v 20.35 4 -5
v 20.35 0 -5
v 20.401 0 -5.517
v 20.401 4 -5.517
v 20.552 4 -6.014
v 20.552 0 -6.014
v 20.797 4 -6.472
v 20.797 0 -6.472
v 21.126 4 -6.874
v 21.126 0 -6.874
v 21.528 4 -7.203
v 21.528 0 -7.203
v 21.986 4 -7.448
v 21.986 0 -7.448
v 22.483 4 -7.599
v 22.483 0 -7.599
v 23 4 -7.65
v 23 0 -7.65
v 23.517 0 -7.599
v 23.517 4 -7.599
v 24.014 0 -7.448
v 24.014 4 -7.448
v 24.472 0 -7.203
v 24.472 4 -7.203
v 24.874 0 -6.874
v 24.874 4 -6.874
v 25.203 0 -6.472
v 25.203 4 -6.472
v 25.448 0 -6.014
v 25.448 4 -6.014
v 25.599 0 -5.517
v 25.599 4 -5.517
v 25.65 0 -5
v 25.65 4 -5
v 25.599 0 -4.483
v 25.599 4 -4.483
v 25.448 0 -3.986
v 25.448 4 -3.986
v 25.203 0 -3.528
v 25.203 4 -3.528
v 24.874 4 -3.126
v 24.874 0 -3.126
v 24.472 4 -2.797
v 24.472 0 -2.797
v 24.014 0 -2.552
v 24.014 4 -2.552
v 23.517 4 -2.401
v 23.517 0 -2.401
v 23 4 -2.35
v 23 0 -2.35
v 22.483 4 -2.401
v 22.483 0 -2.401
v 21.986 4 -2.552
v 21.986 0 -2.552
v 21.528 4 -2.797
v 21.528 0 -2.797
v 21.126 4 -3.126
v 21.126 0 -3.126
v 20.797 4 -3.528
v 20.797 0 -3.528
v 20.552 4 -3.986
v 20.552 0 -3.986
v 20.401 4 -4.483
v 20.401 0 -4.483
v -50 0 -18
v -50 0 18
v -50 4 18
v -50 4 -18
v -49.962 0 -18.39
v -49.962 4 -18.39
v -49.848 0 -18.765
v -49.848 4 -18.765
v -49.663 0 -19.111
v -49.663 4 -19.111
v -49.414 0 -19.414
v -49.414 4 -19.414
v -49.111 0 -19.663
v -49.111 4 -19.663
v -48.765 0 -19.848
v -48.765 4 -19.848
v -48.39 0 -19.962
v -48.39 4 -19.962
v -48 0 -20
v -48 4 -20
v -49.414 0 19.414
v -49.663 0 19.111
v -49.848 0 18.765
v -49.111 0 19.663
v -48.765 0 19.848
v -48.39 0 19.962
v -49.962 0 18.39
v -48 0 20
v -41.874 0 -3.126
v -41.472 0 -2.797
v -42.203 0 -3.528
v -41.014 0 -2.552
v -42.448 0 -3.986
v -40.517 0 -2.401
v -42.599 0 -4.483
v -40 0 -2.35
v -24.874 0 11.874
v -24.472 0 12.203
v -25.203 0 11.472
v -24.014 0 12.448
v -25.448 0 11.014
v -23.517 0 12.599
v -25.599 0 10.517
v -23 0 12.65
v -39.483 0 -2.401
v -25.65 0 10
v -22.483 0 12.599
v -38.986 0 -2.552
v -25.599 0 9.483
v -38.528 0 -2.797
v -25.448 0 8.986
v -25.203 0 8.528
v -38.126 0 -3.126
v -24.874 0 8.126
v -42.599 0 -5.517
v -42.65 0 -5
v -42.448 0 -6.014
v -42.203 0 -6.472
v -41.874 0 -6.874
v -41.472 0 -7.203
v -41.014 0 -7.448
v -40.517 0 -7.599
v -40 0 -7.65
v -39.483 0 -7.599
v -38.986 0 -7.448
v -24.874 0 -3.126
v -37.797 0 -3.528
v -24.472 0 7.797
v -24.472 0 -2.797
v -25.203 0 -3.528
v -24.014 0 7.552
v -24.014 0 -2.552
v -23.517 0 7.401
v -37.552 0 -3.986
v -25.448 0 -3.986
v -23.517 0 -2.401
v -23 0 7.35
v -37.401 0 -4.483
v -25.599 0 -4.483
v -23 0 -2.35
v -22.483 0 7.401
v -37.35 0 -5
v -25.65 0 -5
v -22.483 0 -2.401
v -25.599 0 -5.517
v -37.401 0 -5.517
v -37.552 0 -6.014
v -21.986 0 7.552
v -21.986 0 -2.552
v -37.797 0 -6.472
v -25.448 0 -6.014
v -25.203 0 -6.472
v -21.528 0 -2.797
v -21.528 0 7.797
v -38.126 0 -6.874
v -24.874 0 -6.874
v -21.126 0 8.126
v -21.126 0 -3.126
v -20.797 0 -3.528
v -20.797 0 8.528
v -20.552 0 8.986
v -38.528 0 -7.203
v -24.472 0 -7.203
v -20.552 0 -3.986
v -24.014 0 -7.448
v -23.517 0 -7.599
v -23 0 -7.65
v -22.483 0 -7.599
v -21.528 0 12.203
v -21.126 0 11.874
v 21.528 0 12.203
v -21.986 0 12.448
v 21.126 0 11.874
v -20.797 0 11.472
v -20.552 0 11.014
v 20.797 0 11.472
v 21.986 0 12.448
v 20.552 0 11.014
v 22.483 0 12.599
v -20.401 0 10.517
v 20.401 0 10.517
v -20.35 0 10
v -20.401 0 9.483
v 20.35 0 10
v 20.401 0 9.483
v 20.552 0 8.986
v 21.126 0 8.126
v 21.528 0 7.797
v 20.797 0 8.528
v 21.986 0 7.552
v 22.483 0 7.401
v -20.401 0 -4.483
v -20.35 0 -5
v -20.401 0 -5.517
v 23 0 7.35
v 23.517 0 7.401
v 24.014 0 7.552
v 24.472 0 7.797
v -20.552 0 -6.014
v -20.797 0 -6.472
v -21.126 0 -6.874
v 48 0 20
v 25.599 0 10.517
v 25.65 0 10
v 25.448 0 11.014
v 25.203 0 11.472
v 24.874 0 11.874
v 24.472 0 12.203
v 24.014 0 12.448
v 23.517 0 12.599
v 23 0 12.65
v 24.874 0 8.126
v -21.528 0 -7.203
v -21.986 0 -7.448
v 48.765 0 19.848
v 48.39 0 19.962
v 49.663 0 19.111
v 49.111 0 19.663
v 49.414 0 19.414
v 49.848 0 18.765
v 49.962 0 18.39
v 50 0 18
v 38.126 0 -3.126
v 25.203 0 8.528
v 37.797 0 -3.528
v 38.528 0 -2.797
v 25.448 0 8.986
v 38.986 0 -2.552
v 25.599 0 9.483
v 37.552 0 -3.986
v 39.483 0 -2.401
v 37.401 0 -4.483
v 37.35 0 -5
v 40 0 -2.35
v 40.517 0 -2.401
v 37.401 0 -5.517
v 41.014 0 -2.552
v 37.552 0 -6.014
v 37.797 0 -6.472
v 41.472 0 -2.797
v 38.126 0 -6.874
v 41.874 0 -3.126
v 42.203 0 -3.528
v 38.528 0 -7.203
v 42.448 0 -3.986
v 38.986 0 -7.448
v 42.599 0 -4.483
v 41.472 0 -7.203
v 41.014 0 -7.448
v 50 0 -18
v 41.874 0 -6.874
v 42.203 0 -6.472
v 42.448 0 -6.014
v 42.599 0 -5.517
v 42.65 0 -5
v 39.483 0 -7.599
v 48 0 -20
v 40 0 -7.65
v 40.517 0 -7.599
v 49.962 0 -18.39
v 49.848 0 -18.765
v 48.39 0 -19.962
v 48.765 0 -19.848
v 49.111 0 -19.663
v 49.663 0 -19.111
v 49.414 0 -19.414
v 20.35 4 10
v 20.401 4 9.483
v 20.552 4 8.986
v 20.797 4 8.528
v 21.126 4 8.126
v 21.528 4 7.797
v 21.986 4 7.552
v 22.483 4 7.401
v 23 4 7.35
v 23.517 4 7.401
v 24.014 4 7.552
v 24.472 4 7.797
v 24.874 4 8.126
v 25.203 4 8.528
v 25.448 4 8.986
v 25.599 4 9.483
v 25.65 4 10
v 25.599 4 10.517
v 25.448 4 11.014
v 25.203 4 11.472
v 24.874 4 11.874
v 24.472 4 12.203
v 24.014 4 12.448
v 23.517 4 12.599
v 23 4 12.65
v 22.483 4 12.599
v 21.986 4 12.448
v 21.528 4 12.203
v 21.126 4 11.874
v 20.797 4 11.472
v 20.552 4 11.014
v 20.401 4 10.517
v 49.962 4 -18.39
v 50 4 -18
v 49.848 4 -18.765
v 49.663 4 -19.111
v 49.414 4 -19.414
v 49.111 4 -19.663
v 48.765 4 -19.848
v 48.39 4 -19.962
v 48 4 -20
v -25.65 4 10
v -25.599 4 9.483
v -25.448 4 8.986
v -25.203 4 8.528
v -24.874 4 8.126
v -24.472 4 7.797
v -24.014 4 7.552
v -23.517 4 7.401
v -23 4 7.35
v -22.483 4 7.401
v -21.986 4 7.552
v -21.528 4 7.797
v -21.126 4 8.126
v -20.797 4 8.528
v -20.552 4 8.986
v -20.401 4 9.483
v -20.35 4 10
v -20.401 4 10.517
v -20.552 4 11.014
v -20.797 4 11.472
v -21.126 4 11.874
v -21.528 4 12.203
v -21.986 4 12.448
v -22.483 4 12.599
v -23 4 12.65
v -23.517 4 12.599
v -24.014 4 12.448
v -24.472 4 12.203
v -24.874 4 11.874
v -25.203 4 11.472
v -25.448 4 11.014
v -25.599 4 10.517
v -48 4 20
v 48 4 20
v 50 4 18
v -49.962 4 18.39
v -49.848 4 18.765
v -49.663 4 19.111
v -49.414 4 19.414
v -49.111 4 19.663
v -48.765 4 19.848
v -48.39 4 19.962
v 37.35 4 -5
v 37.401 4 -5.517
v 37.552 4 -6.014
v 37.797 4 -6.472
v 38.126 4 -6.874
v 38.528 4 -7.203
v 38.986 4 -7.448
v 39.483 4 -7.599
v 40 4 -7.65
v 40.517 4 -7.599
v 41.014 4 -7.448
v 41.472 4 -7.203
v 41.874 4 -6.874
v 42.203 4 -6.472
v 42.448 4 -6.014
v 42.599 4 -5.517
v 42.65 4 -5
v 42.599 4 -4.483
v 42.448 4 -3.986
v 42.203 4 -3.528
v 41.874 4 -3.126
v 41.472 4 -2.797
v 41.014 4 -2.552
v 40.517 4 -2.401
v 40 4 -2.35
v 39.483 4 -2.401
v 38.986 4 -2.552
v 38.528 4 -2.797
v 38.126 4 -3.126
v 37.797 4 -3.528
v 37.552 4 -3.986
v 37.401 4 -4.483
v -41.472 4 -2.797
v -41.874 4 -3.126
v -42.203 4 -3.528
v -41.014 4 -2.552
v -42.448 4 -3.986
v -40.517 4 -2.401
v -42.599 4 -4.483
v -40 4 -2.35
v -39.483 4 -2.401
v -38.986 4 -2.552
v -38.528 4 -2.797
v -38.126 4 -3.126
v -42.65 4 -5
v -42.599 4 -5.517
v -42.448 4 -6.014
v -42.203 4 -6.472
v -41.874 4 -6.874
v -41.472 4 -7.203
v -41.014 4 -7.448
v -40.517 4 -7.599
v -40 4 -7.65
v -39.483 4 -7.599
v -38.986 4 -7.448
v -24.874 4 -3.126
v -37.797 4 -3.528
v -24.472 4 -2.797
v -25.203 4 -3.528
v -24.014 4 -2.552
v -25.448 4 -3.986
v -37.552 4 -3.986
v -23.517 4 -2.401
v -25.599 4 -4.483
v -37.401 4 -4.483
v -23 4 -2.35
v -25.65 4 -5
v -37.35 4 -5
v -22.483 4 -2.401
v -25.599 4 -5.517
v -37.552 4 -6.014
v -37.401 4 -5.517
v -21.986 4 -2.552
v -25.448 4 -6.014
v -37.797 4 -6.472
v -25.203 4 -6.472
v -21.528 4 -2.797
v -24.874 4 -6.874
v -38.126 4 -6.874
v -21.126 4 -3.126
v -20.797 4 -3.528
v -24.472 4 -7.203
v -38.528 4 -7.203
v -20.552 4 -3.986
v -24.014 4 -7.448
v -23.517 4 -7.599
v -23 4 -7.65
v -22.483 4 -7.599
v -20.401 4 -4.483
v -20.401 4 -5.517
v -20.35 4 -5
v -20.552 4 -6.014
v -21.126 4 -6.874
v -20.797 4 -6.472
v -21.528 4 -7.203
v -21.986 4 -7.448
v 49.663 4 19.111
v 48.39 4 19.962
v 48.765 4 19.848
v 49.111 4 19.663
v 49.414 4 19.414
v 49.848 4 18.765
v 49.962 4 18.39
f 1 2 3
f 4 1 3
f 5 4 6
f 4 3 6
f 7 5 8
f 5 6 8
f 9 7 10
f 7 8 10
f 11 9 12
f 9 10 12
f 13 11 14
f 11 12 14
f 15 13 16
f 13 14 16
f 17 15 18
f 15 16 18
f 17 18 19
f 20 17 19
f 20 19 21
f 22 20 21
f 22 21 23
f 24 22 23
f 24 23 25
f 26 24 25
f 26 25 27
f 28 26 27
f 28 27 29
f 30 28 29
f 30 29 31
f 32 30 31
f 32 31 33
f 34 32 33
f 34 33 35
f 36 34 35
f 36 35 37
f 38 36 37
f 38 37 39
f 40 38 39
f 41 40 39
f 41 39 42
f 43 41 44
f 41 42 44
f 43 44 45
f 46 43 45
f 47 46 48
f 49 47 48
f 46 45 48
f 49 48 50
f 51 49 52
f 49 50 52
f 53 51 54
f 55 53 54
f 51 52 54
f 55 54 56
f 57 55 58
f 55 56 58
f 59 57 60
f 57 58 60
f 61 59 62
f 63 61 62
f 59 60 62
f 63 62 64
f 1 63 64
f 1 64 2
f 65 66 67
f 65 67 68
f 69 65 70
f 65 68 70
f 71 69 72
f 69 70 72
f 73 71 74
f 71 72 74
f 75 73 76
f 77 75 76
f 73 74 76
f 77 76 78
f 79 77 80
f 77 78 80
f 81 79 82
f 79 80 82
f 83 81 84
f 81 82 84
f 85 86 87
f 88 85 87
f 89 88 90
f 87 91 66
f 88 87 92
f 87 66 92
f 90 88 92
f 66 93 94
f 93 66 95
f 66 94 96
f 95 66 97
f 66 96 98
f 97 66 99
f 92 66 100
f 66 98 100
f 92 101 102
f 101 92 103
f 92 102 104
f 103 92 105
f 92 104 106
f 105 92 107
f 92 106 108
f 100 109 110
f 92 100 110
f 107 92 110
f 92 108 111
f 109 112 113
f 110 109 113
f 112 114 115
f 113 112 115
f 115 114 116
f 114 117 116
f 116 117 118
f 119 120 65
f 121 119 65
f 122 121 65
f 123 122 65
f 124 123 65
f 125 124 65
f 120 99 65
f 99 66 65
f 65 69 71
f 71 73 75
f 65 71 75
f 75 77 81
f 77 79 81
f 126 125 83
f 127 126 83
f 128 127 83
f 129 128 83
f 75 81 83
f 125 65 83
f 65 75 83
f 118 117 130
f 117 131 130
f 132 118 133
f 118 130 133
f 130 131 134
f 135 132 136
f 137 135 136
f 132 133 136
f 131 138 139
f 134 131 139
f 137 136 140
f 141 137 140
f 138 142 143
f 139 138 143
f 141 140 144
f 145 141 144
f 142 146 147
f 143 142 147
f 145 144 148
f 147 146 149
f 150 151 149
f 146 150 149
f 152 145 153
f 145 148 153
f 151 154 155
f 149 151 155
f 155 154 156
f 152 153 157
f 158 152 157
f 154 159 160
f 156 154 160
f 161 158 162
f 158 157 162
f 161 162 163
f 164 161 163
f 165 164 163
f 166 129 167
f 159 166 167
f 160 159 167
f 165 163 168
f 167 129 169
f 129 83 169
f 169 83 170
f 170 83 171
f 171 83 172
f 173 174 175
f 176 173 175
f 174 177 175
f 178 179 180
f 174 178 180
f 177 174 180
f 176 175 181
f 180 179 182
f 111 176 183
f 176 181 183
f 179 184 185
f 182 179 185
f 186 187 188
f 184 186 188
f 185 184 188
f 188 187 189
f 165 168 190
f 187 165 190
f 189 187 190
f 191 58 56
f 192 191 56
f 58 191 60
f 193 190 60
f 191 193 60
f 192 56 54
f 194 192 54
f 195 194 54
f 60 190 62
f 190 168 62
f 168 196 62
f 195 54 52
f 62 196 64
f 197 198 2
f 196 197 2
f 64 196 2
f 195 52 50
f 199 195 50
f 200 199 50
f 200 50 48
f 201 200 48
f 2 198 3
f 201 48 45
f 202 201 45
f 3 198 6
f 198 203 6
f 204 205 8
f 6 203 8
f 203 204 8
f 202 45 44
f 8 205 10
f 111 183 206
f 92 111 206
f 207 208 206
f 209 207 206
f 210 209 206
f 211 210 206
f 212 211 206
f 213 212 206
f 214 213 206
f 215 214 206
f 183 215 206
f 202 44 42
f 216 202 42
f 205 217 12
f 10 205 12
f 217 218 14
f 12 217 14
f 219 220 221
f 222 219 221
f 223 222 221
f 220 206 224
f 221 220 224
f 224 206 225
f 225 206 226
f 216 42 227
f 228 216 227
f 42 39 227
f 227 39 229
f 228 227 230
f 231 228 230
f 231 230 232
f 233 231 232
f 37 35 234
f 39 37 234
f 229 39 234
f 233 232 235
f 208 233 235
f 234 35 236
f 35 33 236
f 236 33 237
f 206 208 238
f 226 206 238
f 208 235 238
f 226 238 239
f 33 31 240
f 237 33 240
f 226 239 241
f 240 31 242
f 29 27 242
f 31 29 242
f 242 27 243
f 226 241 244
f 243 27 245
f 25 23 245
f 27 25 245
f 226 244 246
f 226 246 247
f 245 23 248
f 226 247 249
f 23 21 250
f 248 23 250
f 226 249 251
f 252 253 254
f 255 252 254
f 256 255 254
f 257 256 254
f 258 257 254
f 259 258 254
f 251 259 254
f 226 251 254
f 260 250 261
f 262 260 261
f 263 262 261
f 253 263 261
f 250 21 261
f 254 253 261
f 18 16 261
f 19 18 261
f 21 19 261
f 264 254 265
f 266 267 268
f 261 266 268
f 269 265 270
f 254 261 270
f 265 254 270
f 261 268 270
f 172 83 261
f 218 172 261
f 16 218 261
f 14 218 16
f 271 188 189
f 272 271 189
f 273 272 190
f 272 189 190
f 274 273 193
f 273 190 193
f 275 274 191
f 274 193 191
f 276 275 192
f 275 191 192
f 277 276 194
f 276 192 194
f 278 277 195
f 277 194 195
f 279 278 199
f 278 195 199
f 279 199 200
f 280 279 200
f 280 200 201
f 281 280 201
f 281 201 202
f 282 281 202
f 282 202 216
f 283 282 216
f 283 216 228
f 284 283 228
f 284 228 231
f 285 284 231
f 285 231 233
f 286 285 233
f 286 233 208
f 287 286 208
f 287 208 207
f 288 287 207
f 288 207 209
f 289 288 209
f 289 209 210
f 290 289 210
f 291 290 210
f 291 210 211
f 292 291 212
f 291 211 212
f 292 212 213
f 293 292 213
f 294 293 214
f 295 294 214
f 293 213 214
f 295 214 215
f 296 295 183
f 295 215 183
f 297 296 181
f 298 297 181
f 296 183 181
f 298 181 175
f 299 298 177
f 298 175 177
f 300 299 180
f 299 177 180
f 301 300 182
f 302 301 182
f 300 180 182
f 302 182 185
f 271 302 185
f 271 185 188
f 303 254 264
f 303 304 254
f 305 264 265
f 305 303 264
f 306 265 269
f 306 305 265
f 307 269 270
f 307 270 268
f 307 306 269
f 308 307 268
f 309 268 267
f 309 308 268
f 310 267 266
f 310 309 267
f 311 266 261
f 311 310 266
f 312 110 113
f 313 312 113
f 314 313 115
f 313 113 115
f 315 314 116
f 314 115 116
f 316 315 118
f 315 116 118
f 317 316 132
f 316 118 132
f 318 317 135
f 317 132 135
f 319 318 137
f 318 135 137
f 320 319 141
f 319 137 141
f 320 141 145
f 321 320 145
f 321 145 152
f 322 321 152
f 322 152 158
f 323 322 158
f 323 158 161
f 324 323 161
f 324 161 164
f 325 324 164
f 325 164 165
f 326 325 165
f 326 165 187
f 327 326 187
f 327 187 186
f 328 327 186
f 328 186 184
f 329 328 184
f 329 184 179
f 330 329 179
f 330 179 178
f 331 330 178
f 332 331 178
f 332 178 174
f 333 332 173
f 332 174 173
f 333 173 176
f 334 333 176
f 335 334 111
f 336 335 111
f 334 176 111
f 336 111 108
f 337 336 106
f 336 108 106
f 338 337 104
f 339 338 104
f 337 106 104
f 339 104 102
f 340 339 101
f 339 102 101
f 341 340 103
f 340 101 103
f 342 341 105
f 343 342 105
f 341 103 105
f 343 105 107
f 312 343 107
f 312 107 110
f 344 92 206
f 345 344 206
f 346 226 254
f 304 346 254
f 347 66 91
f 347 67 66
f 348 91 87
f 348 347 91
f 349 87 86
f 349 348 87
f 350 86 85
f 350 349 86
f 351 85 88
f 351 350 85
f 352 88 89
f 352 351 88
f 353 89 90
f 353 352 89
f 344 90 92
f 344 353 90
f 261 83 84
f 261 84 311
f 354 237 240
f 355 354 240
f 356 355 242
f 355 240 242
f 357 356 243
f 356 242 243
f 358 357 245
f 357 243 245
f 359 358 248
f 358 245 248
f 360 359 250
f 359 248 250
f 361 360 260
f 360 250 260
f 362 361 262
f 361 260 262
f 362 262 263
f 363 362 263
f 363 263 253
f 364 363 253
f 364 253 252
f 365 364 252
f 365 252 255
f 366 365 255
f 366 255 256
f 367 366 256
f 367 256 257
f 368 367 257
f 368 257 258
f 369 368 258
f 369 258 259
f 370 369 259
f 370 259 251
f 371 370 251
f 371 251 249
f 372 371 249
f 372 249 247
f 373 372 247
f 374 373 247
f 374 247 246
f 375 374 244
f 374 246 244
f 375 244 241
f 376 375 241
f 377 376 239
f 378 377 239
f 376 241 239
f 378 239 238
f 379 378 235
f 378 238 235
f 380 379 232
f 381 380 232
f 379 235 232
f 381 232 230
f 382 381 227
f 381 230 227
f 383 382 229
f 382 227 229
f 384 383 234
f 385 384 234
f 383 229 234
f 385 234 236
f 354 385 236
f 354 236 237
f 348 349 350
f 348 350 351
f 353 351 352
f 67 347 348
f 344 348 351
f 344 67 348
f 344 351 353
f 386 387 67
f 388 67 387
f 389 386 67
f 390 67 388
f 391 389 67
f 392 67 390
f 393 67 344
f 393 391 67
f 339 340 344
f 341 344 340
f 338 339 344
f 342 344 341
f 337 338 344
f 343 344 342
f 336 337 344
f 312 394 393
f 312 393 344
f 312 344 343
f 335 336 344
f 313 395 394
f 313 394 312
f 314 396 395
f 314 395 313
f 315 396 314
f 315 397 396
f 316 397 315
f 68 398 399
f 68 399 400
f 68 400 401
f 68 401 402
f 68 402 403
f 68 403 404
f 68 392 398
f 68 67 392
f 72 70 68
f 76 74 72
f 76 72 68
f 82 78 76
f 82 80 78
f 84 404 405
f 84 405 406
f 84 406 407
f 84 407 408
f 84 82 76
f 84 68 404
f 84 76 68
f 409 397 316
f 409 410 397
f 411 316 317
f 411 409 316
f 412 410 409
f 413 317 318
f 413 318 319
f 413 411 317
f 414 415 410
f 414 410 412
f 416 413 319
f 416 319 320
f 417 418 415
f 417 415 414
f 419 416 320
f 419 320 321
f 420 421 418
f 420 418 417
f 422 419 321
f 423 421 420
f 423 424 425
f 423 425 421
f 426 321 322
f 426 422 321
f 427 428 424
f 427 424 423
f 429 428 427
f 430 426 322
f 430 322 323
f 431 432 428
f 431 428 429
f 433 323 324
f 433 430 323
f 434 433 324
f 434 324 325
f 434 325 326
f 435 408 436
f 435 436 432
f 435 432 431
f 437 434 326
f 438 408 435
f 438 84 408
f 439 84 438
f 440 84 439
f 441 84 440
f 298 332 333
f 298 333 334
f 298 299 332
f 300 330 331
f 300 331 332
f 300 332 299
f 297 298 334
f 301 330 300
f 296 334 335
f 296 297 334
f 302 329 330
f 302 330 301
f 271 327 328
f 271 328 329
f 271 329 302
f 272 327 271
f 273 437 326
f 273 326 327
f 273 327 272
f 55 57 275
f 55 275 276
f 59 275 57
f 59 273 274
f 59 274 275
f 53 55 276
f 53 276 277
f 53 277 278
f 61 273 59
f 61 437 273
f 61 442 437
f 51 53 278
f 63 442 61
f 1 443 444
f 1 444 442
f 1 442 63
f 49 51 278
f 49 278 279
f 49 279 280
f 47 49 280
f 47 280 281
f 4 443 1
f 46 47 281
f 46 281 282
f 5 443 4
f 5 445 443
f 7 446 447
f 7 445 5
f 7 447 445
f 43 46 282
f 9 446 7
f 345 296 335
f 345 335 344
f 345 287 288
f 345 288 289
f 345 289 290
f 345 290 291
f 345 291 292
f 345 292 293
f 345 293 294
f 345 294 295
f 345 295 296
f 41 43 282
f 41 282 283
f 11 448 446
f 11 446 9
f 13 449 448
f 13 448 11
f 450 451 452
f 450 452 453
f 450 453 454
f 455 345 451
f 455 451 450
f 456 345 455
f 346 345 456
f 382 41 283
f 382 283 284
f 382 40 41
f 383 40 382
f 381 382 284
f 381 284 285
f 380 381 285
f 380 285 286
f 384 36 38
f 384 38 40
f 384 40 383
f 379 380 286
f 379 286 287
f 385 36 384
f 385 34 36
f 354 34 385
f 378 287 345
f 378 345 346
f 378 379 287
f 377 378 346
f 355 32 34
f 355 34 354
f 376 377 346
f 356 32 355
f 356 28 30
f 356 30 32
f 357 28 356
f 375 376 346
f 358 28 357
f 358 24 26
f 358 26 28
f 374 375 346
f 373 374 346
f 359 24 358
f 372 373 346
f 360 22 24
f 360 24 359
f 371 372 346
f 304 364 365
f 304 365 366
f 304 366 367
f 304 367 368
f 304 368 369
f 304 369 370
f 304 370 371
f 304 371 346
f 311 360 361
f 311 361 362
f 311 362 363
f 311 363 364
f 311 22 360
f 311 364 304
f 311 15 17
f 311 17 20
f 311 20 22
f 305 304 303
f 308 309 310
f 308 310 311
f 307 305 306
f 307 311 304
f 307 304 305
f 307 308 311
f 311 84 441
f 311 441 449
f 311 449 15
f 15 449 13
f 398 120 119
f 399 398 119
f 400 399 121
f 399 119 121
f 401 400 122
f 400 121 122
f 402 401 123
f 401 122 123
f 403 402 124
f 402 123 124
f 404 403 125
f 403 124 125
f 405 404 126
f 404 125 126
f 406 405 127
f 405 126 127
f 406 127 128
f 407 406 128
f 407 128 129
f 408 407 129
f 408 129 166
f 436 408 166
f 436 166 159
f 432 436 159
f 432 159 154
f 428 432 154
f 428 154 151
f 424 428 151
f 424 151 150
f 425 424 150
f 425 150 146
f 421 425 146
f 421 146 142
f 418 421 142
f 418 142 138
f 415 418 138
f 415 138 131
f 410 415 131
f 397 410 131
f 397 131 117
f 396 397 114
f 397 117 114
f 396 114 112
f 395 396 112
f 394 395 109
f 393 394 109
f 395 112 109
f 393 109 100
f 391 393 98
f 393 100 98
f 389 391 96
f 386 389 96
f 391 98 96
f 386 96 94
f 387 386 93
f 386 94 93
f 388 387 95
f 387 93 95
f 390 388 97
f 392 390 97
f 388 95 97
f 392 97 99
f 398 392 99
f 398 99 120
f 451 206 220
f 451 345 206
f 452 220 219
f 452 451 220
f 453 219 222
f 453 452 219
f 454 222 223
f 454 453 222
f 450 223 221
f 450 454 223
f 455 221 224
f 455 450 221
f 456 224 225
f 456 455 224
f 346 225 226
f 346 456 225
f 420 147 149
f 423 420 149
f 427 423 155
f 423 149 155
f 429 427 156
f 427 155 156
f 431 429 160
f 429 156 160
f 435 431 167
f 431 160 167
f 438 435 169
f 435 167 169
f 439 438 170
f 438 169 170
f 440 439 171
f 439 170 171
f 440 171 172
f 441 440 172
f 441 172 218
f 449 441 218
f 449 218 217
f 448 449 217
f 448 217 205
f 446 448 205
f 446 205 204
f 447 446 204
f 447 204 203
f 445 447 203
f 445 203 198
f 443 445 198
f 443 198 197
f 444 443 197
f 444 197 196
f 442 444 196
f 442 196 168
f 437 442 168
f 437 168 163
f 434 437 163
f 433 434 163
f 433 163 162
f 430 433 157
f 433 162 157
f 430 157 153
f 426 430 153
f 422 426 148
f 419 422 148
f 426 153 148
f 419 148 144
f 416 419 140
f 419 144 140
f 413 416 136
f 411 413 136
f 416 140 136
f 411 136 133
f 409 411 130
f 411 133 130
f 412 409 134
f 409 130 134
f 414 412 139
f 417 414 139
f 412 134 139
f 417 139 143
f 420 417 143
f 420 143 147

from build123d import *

# Parameters (mm, degrees)
SKETCH1_W                = 100
SKETCH1_H                = 40
BOSS_EXTRUDE1_DEPTH      = 4
FILLET1_R                = 2
M5_CLEARANCE_HOLE1_D     = 5.3
M5_CLEARANCE_HOLE1_DEPTH = 8
M5_CLEARANCE_HOLE1_TIP   = 1.59228064


with BuildPart() as part:
    # Sketch1 → Boss-Extrude1 (new body)
    with BuildSketch(Plane(origin=(0, 0, 0), x_dir=(1, 0, 0), z_dir=(0, 1, 0))):
        Rectangle(SKETCH1_W, SKETCH1_H)
    extrude(amount=BOSS_EXTRUDE1_DEPTH)

    # Fillet1
    fillet1_edges = [part.edges().sort_by_distance(p)[0] for p in [
        (-50, 2, -20),
        (50, 2, -20),
        (50, 2, 20),
        (-50, 2, 20),
    ]]
    fillet(fillet1_edges, radius=FILLET1_R)

    # M5 Clearance Hole1
    with Locations(Plane(origin=(0, 4, 0), x_dir=(1, 0, 0), z_dir=(0, 1, 0))):
        with Locations((-40, 5), (-23, 5), (-23, -10), (23, -10), (23, 5), (40, 5)):
            Hole(M5_CLEARANCE_HOLE1_D / 2, depth=M5_CLEARANCE_HOLE1_DEPTH)
            with Locations((0, 0, -(M5_CLEARANCE_HOLE1_DEPTH + M5_CLEARANCE_HOLE1_TIP / 2))):  # 118° drill point
                Cone(0, M5_CLEARANCE_HOLE1_D / 2, M5_CLEARANCE_HOLE1_TIP, mode=Mode.SUBTRACT)


solid = part.part
